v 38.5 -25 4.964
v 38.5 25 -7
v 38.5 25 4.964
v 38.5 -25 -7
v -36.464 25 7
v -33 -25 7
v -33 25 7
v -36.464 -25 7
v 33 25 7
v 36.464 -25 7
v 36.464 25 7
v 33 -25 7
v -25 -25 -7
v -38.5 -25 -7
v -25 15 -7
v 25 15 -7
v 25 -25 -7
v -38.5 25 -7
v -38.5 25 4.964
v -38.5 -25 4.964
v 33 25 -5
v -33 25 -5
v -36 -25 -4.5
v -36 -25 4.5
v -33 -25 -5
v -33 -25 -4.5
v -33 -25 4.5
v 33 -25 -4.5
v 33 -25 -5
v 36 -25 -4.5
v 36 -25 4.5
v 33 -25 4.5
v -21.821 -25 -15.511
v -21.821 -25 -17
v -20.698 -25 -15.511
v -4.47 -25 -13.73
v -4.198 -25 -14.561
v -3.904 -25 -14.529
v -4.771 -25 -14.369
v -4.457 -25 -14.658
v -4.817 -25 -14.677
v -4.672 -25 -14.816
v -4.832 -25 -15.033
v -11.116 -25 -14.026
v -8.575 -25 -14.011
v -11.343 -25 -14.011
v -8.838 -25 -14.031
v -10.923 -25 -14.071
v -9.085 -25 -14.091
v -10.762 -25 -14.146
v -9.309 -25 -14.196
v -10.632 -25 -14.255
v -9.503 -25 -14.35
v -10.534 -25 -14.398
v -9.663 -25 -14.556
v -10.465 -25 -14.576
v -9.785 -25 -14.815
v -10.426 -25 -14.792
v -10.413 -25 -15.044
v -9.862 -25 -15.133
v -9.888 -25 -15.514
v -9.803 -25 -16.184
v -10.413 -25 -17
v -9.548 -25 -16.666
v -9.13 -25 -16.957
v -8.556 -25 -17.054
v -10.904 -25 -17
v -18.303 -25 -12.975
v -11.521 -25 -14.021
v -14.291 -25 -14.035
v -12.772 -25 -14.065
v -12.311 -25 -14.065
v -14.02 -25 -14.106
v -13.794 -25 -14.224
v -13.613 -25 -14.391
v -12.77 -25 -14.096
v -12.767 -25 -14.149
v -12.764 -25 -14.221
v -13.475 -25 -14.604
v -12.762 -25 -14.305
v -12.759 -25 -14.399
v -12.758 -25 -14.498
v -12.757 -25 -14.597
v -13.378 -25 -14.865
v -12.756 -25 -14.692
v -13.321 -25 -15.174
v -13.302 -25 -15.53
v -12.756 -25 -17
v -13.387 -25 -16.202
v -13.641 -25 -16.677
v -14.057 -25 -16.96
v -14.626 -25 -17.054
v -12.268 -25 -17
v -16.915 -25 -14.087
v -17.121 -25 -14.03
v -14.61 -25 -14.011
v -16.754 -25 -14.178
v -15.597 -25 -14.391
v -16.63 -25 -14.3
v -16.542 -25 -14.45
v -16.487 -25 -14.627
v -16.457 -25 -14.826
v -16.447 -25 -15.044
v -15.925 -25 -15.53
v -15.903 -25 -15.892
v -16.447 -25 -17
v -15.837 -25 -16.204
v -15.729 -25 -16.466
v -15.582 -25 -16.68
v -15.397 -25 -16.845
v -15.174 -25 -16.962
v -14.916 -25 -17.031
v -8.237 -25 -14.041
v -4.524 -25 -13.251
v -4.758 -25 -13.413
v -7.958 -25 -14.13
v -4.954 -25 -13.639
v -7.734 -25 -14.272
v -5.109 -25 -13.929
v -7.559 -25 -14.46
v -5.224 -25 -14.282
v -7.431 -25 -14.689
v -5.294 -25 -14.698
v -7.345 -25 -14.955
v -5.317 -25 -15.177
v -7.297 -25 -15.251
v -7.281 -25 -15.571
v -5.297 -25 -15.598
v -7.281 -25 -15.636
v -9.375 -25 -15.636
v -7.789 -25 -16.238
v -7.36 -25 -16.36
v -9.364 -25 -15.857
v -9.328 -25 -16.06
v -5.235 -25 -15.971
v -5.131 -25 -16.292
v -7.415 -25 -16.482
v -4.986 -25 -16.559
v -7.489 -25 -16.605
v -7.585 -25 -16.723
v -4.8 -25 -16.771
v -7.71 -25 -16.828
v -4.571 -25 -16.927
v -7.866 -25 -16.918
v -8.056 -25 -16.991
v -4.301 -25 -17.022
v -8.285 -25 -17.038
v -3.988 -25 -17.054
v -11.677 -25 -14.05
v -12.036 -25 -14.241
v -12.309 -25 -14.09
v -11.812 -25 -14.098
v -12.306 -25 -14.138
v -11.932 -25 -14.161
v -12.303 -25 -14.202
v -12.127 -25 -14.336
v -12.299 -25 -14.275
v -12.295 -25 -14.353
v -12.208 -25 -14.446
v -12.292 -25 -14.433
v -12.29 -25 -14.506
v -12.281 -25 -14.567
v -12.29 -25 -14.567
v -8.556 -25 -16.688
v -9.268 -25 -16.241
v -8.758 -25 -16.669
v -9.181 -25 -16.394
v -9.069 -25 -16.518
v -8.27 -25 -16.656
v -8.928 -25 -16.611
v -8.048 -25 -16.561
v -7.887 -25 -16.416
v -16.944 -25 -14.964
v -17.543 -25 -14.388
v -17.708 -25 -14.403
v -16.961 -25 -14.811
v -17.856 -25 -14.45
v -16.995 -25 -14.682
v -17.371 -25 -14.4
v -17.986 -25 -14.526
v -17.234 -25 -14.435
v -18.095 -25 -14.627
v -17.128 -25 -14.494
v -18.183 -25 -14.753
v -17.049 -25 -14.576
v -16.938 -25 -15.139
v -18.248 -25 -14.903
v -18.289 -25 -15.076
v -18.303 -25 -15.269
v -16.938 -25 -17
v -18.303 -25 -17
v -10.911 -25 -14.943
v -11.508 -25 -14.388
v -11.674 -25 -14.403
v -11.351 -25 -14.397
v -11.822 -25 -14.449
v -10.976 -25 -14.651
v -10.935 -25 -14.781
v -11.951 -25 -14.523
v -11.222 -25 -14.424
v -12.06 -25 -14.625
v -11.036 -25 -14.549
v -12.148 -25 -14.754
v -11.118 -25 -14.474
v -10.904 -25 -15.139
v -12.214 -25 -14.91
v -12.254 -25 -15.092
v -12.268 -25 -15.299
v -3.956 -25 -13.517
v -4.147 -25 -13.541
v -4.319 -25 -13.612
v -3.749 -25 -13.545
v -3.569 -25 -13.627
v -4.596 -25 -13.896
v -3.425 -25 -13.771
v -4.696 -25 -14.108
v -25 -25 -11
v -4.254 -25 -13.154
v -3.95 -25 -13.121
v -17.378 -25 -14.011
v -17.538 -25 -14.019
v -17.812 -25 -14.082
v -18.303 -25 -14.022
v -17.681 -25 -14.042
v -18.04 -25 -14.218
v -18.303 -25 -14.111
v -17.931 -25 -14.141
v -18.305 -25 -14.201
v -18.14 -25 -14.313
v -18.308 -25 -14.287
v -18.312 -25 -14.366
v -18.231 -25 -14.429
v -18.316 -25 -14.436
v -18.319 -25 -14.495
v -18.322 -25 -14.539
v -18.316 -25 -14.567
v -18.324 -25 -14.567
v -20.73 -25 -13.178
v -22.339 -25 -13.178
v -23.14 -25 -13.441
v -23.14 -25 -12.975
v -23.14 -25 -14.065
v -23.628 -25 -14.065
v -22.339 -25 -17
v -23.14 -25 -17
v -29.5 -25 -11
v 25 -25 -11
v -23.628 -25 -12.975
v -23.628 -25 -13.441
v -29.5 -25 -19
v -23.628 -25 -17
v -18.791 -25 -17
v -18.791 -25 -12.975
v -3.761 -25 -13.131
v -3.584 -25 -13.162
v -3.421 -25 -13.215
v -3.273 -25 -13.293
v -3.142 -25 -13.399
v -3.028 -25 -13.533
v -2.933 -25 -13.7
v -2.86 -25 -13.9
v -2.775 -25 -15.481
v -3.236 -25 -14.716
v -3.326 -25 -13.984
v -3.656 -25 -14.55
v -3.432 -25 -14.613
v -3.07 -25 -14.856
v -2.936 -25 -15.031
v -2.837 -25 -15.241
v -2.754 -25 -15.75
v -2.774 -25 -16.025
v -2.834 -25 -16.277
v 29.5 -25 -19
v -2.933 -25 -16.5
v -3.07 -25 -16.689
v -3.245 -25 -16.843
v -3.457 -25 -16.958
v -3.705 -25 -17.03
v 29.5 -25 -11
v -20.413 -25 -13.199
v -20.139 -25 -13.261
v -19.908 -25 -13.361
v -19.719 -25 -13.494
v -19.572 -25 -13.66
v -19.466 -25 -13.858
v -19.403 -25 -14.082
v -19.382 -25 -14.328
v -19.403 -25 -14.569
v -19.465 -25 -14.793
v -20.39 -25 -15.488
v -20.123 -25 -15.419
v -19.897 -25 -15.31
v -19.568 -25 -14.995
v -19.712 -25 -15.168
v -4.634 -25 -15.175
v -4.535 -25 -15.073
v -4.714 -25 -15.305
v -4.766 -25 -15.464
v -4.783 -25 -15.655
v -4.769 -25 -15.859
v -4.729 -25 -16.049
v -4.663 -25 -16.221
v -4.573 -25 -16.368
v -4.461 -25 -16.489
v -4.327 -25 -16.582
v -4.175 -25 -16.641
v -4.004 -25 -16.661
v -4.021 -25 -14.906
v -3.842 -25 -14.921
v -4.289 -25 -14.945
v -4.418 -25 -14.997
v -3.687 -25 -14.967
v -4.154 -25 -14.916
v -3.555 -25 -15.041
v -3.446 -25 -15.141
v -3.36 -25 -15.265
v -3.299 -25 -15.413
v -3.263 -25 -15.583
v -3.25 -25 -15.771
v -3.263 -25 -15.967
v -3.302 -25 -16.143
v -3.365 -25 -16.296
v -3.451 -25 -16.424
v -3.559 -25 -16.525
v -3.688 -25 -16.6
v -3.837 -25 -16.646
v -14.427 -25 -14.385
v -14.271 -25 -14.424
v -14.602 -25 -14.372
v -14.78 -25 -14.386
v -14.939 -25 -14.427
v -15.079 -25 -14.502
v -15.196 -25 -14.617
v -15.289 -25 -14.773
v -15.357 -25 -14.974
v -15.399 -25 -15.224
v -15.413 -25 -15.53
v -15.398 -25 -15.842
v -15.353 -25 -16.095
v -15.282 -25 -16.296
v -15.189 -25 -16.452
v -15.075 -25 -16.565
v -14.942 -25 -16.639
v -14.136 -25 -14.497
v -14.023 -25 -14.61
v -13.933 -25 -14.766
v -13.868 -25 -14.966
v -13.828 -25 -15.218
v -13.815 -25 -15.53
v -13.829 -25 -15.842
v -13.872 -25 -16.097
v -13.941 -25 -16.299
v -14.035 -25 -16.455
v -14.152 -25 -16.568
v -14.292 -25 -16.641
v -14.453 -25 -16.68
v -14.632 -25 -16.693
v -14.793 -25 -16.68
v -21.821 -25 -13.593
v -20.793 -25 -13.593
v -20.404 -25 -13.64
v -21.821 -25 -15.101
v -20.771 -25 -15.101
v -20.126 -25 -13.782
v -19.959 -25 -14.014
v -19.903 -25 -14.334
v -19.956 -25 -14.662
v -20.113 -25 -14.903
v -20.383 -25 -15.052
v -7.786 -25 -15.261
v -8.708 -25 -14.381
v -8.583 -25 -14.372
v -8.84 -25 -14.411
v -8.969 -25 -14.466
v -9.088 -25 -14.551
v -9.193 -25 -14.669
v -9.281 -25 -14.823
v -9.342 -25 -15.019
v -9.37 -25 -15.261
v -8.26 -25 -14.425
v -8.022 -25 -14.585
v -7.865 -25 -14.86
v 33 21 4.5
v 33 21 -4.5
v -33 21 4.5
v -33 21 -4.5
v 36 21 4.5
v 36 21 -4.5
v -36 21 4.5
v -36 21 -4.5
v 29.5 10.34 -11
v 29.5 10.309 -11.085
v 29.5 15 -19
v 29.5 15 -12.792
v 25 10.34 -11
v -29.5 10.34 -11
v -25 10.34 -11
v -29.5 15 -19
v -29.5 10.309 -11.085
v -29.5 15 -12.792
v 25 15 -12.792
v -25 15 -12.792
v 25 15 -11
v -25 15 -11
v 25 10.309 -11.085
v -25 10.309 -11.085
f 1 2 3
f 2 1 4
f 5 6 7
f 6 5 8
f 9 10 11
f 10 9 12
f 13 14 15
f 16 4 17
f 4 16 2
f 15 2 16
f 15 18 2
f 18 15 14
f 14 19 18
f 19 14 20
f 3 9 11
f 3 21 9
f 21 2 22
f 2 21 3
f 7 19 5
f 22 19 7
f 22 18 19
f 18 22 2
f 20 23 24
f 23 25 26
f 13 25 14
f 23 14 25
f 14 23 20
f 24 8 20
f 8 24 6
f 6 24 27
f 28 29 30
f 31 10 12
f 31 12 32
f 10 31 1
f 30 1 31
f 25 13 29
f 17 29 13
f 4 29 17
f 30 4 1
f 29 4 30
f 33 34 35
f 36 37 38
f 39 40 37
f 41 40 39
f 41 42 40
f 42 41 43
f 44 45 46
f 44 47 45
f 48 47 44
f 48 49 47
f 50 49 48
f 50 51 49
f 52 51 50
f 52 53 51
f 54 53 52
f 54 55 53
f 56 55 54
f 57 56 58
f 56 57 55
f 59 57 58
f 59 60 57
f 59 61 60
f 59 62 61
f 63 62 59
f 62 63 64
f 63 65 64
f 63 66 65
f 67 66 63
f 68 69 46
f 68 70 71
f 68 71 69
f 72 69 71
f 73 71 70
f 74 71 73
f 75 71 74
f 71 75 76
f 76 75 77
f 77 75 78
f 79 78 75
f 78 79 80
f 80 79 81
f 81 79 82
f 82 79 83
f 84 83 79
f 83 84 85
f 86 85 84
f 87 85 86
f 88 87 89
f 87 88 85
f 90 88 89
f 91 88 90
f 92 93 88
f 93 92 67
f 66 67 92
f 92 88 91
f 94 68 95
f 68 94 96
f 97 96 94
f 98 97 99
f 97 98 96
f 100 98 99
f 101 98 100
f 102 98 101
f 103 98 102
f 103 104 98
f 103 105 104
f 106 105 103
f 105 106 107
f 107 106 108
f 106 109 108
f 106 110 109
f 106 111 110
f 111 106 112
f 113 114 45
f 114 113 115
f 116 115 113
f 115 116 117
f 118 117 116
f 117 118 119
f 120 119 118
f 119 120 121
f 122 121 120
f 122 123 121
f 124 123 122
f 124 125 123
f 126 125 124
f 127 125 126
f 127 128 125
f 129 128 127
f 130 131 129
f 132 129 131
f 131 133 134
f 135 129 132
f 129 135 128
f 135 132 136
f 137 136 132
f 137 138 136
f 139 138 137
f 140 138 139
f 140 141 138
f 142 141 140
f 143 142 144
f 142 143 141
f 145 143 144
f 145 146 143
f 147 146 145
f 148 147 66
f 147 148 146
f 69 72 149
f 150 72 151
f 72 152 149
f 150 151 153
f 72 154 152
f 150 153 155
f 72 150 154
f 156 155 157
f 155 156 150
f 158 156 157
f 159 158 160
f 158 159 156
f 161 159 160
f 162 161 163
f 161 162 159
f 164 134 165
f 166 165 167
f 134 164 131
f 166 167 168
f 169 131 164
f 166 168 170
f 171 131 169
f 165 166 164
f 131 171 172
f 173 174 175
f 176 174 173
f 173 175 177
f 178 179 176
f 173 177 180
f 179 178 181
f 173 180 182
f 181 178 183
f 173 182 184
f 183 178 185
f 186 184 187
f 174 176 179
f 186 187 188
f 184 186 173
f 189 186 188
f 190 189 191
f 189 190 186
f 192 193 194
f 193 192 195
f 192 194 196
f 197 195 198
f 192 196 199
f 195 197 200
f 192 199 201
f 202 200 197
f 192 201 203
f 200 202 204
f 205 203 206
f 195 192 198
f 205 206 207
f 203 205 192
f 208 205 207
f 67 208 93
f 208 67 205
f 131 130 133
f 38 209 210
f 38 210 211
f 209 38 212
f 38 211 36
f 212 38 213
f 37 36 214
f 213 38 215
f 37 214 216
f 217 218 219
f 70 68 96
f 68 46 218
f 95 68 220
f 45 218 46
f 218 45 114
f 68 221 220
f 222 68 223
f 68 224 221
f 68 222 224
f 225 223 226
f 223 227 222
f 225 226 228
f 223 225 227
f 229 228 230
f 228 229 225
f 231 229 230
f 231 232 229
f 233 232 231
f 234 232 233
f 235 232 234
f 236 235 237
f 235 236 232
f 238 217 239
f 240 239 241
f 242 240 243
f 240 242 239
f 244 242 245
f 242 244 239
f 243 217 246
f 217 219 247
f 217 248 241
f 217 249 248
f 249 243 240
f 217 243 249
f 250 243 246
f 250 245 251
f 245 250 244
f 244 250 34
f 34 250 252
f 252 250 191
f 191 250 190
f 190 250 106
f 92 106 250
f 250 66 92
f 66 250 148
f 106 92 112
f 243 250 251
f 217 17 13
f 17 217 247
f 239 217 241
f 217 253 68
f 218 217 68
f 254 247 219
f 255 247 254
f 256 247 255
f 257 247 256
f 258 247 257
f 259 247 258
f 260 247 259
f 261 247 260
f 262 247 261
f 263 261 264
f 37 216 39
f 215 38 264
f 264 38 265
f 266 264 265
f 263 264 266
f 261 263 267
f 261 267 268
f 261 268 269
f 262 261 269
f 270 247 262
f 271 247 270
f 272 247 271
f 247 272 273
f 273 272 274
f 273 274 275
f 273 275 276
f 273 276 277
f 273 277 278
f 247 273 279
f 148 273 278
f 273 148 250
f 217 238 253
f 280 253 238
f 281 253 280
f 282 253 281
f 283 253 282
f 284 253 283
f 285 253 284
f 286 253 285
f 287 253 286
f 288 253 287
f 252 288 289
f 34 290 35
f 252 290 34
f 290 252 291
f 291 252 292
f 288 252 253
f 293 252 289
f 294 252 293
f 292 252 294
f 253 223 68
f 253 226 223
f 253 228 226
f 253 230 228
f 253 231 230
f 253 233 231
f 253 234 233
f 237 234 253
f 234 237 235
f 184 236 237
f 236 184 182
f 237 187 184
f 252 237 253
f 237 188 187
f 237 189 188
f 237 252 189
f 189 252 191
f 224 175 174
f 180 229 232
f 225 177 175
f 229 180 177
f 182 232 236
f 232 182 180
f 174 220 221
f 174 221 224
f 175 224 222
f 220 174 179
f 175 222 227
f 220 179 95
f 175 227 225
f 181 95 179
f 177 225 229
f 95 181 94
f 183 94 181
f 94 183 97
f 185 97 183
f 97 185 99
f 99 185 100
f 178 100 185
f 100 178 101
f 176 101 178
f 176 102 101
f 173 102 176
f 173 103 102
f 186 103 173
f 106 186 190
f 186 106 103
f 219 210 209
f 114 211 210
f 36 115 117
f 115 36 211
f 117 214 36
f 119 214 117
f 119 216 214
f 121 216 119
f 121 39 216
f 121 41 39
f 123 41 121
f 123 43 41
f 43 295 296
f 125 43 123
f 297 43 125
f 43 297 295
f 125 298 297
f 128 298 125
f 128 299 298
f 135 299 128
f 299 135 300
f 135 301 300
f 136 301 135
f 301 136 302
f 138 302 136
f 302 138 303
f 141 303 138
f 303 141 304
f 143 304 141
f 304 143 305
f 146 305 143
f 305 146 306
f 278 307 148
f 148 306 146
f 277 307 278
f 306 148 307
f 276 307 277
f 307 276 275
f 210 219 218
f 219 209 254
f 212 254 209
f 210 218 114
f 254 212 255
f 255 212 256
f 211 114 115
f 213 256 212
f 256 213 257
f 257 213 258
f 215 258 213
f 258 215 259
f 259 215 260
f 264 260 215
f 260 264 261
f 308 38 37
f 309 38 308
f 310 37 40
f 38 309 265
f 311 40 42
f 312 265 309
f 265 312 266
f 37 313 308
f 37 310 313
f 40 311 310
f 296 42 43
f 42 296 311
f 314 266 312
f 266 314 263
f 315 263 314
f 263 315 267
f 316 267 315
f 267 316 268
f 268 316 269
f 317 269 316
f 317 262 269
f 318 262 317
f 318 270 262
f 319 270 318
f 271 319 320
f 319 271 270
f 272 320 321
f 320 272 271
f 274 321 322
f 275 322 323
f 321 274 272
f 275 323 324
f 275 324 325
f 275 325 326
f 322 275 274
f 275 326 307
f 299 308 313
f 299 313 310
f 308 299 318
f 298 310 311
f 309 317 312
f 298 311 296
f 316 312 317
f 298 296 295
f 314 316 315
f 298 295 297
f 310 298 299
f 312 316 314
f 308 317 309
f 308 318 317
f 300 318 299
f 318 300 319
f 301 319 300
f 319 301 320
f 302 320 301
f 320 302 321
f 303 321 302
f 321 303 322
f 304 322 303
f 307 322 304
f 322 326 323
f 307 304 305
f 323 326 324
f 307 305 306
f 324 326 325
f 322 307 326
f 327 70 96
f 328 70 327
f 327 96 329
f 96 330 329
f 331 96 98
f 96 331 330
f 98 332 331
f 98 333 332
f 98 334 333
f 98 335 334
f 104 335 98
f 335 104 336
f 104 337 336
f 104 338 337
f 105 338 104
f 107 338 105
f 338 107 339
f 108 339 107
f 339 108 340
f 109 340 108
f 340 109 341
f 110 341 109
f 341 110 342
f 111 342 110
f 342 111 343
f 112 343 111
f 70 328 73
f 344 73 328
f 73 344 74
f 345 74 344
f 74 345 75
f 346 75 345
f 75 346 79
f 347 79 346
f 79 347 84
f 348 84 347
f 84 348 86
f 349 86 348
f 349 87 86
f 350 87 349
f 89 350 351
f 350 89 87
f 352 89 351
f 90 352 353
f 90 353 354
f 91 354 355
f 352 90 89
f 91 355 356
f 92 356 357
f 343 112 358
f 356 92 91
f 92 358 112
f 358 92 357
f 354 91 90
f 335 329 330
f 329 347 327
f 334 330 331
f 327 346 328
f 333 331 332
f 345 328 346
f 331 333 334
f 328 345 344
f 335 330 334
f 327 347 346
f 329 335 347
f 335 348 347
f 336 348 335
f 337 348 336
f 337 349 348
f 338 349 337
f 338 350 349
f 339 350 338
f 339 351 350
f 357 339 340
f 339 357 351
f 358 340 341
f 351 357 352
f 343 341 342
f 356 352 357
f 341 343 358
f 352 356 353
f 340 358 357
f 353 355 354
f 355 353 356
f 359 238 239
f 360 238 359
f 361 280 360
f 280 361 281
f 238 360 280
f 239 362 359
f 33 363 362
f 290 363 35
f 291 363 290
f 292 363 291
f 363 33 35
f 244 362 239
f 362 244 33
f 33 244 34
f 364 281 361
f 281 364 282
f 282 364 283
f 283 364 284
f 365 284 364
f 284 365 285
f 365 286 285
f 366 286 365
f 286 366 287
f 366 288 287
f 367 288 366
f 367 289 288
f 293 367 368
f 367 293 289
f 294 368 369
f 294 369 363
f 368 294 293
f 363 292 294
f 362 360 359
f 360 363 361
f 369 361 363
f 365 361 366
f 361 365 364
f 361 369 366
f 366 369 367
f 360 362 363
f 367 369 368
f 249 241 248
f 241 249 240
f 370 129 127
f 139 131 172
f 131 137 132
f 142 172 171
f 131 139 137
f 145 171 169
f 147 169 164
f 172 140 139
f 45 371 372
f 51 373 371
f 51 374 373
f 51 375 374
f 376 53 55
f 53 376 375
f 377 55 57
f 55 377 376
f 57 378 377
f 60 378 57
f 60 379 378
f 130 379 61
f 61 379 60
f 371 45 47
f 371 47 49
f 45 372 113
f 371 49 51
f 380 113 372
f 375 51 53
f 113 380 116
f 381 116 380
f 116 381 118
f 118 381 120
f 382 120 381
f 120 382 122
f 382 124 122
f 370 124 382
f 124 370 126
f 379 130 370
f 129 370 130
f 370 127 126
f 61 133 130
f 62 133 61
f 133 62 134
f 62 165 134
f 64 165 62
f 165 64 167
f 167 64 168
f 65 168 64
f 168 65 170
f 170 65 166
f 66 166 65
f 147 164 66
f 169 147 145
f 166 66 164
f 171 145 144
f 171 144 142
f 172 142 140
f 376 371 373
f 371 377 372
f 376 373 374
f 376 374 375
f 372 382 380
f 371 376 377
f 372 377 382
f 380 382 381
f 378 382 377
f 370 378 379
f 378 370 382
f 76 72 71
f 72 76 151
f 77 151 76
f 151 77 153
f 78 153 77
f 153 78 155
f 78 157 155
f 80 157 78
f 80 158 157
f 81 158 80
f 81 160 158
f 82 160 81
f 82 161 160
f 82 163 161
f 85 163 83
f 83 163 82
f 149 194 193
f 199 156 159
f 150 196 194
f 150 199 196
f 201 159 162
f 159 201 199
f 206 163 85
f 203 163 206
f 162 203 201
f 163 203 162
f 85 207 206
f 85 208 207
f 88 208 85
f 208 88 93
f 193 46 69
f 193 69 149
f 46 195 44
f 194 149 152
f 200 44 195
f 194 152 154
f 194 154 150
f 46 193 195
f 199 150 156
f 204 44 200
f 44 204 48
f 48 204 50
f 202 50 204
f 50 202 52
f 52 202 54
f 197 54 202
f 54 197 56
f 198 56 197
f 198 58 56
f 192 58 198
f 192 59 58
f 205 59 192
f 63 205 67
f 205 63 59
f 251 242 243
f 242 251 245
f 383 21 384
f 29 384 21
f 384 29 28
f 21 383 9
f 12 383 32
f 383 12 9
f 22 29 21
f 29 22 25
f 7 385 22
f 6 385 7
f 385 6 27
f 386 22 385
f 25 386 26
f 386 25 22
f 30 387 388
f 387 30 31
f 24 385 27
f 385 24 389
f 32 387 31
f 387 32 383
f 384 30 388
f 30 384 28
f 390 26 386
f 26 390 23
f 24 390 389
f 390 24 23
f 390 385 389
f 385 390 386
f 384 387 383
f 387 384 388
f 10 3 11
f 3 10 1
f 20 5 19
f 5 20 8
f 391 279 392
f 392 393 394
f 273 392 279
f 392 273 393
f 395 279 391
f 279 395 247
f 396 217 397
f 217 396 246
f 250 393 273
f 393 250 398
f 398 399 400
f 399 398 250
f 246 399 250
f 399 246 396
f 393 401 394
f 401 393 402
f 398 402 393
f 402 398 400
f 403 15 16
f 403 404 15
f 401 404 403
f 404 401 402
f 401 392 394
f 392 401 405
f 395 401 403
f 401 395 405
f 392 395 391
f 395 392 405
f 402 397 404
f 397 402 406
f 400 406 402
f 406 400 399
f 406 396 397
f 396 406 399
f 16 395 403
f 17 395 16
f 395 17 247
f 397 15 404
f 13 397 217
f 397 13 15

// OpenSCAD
// Adaptor for iPhone6 on iPhone 4/5 Brodit Mount

length = 50;  // body for iPhone6
width = 9;    // slot for iPhone6 with case

difference(){
  cube([77,length,14],center=true);  // body for iPhone 6
  translate([0,0,0]) cube([66,length,10],center=true);
  translate([0,-4,0]) cube([72,length,width],center=true);  // slot
  translate([0,0,10]) cube([66,length,10],center=true);
  translate([40,0,7]) rotate([0,45,0]) cube([5,length,5],center=true);  // phase top
  translate([-40,0,7]) rotate([0,45,0]) cube([5,length,5],center=true);  // phase top
}

translate([0,((length/2)*-1)+20,-9]) cube([50,40,4],center=true); // middle part
difference(){
  translate([0,((length/2)*-1)+20,-15]) cube([59,40,8],center=true); // adaptor iPhone 5
  translate([30,((length/2)*-1)+38,-11]) rotate([-20,0,0]) cube([10,5,2],center=true);  // phase
  translate([-30,((length/2)*-1)+38,-11]) rotate([-20,0,0]) cube([10,5,2],center=true); // phase
  translate([-24,((length/2)*-1),-17]) rotate([90,0,0]) linear_extrude(height = 1 , convexity = 110) text("iPhone 6", size=4, font="Liberation Sans");
}
